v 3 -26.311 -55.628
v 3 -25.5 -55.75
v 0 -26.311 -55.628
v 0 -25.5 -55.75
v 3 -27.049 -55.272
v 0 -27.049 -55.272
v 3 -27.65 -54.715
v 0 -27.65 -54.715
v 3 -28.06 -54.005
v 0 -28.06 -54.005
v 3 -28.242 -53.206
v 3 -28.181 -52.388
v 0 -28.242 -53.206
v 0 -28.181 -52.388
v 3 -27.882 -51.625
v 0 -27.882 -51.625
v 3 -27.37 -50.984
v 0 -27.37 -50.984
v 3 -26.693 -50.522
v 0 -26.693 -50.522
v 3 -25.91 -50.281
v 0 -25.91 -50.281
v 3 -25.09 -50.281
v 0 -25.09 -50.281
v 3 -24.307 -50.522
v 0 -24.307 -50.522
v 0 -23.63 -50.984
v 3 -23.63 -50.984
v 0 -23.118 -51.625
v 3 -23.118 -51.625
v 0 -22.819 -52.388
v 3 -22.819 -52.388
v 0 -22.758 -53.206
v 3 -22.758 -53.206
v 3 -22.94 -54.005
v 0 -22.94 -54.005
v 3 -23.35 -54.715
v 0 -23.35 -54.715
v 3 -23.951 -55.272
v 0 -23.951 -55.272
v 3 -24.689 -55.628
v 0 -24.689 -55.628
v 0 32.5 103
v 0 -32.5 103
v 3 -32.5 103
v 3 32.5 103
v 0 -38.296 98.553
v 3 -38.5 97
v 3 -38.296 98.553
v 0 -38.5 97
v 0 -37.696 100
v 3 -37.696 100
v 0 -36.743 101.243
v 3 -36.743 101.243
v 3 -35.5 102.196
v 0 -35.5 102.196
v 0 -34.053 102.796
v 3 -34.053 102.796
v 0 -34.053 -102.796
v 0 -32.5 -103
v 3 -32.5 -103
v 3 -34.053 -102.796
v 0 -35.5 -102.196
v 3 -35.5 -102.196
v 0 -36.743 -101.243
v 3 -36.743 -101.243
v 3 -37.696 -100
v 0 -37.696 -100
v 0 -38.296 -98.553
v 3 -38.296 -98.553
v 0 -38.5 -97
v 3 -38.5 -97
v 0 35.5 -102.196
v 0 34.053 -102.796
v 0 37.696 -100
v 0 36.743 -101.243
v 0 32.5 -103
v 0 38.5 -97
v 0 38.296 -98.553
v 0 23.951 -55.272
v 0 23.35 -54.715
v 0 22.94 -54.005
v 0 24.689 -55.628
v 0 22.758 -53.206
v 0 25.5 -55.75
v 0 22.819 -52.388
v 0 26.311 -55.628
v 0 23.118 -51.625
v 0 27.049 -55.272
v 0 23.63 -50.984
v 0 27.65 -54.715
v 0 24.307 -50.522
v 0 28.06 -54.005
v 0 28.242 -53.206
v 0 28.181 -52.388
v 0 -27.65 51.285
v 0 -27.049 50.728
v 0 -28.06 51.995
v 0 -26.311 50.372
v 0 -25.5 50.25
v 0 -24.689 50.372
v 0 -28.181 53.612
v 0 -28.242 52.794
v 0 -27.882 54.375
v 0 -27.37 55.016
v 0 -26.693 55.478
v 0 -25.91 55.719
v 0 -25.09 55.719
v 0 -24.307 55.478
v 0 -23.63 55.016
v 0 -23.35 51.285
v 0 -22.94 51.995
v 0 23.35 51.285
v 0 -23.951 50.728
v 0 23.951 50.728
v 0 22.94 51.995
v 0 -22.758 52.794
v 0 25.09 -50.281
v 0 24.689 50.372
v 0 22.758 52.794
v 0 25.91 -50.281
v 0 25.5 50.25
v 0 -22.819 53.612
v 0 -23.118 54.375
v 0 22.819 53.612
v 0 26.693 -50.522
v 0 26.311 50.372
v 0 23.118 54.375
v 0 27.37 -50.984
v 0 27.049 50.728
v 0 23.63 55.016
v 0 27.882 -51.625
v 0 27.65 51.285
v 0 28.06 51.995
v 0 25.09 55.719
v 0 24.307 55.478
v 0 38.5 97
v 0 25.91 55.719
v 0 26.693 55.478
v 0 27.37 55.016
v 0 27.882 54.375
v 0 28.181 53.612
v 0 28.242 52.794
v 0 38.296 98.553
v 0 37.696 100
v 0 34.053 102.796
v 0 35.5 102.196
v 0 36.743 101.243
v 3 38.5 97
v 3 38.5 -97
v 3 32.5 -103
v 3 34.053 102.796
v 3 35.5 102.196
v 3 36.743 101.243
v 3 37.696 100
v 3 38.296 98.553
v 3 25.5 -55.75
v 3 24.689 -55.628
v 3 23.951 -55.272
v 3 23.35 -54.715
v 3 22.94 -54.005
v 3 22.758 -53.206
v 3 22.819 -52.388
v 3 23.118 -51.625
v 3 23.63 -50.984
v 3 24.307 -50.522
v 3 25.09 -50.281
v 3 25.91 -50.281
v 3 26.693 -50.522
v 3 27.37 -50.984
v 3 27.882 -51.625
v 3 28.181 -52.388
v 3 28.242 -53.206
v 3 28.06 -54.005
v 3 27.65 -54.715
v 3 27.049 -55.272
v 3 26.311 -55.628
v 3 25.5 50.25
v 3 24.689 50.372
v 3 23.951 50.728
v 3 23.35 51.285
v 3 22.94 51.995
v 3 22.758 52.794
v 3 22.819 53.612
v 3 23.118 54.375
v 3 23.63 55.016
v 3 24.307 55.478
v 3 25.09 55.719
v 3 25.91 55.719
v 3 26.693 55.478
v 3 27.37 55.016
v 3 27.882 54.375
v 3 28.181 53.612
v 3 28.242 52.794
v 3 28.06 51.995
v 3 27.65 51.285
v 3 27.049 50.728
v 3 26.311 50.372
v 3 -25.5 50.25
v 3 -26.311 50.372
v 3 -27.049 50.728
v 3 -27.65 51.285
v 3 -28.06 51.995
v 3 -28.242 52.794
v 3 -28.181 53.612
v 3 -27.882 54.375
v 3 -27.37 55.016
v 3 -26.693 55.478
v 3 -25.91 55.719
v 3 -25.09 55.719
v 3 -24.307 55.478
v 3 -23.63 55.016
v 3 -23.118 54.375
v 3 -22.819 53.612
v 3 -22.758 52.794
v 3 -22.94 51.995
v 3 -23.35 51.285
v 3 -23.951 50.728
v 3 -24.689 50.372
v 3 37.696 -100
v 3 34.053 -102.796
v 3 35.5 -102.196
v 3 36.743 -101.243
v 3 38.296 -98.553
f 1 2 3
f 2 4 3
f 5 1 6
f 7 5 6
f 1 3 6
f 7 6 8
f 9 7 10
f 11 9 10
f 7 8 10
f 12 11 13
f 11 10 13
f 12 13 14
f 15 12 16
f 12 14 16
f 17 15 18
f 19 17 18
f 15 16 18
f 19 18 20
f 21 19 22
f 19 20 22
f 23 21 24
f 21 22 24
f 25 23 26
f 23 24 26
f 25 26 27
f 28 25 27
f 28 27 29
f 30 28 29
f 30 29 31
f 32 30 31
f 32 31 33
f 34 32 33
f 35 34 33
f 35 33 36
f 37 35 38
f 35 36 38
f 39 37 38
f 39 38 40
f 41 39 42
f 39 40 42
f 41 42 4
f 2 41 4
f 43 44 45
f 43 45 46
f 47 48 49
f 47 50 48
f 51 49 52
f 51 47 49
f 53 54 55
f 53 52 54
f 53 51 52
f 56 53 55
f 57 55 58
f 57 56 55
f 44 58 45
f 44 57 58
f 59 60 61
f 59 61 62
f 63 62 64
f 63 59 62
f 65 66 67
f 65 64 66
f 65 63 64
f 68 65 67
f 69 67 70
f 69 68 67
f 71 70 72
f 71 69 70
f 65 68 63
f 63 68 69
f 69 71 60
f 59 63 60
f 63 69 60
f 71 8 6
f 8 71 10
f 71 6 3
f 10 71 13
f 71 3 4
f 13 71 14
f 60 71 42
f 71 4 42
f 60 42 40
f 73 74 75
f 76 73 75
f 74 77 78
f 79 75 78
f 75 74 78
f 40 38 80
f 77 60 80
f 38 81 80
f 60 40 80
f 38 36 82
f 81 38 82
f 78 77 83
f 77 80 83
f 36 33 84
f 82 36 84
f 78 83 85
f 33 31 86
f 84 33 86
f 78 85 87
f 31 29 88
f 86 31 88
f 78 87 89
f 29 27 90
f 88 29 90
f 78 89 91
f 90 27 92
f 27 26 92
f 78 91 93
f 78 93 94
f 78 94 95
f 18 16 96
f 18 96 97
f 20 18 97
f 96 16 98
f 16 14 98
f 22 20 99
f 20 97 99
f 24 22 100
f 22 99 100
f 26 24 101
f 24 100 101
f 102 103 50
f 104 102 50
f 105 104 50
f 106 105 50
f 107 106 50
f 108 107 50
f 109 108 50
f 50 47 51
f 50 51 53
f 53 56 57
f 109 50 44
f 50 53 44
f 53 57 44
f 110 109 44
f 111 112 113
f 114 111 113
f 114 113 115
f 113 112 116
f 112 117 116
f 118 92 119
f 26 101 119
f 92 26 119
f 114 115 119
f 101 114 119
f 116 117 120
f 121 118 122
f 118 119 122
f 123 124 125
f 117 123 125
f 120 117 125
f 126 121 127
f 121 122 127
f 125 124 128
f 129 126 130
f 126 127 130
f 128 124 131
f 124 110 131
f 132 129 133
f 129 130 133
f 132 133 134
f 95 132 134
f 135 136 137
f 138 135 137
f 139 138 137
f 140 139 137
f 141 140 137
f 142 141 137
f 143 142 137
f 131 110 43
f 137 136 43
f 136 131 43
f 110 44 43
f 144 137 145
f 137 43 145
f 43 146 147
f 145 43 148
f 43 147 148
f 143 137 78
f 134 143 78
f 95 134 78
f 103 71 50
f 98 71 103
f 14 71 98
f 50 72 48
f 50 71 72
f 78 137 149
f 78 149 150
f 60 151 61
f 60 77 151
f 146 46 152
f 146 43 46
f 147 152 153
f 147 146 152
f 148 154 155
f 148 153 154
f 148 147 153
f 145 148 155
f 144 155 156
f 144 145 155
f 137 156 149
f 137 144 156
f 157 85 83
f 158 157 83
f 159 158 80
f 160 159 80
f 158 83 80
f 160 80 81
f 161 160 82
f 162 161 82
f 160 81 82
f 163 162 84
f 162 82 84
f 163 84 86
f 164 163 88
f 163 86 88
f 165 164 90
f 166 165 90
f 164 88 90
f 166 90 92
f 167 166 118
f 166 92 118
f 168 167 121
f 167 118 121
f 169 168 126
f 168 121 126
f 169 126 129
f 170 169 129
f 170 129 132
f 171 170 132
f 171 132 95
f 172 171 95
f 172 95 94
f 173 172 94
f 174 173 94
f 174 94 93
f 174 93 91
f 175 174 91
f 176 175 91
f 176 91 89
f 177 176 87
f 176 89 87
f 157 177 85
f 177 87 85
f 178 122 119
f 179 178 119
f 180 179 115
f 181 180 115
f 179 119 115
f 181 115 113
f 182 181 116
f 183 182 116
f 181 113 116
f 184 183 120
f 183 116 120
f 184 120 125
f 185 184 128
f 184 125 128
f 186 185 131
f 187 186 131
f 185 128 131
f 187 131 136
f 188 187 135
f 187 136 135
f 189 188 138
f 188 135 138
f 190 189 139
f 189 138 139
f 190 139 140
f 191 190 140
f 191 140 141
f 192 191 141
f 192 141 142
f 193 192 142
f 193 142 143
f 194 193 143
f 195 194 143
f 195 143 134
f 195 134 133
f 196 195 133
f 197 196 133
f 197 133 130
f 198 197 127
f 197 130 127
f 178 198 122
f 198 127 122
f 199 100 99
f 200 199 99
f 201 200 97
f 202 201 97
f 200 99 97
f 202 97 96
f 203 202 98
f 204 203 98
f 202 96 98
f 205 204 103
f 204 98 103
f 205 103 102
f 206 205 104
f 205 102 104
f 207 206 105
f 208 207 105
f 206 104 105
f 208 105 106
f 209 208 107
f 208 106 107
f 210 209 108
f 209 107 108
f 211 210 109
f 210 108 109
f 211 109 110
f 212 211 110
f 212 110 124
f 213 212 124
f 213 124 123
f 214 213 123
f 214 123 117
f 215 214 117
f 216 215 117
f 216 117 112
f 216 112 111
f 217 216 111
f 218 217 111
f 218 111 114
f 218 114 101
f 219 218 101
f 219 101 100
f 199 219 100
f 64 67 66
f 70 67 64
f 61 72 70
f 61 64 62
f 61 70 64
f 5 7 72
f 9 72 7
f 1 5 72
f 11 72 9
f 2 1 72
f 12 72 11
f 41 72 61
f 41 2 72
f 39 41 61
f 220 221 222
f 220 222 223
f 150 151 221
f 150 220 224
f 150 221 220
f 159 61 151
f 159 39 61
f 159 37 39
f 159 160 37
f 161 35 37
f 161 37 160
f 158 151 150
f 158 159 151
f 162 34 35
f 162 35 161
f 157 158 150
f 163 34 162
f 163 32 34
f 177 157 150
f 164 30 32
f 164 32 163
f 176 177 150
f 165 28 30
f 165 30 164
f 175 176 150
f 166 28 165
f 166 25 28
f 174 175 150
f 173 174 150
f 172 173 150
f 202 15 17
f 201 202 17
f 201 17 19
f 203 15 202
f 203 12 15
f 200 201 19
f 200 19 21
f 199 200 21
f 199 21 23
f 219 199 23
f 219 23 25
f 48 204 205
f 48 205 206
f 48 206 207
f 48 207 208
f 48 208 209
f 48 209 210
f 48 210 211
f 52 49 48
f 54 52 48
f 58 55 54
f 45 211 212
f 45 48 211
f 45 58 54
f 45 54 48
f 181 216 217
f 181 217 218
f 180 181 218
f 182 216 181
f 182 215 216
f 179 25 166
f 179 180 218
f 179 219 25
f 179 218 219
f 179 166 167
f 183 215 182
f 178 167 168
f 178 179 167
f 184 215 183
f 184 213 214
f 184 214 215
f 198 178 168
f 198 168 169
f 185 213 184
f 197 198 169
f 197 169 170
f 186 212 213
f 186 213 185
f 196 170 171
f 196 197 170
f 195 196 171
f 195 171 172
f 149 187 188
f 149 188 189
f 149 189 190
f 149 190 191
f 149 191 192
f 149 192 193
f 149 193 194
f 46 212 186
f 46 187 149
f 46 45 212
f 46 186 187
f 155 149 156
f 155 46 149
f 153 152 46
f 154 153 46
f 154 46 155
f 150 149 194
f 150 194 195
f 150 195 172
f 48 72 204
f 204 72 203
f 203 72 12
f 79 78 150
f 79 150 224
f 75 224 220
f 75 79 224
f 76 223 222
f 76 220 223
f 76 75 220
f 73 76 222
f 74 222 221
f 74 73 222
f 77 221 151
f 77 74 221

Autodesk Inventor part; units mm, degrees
ref_plane "YZ Plane" through (0, 0, 0) normal (1, 0, 0) x (0, 1, 0)
ref_plane "XZ Plane" through (0, 0, 0) normal (0, 1, 0) x (-1, 0, 0)
ref_plane "XY Plane" through (0, 0, 0) normal (0, 0, 1) x (1, 0, 0)
sketch "Szkic1" plane through (0, 0, 0) normal (1, 0, 0) x (0, 1, 0)
  line L0 (-32.5, 103) -> (32.5, 103)
  line L1 (38.5, 97) -> (38.5, -97)
  line L2 (32.5, -103) -> (-32.5, -103)
  line L3 (-38.5, -97) -> (-38.5, 97)
  line L4 (-38.5, 103) -> (38.5, -103) construction
  arc A0 (32.5, -103) -> (38.5, -97) centre (32.5, -97) ccw
  arc A1 (-32.5, 103) -> (-38.5, 97) centre (-32.5, 97) ccw
  arc A2 (-38.5, -97) -> (-32.5, -103) centre (-32.5, -97) ccw
  arc A3 (38.5, 97) -> (32.5, 103) centre (32.5, 97) ccw
  point P0 (0, 0)
  dimension "d3" = 6
extrude "Płyta1" add sketch "Szkic1" along normal blind 3
sketch "Szkic2" plane through (3, 0, 0) normal (1, 0, 0) x (0, 0, -1)
  line L0 (-97, 38.5) -> (97, 38.5) projected
  line L1 (-103, -32.5) -> (-103, 32.5) projected
  line L2 (103, 32.5) -> (103, -32.5) projected
  line L3 (97, -38.5) -> (-97, -38.5) projected
  point P0 (0, 0)
  point P1 (-53, 25.5)
  point P2 (53, 25.5)
  point P3 (53, -25.5)
  point P4 (-53, -25.5)
  dimension "d5" = 13
  dimension "d6" = 50
  dimension "d7" = 50
  dimension "d8" = 13
  dimension "d9" = 50
  dimension "d10" = 13
  dimension "d11" = 13
  dimension "d12" = 50
hole "Otwór1" at (3, -25.5, 53) at (3, 25.5, 53) at (3, 25.5, -53) at (3, -25.5, -53) direction (-1, 0, 0) diameter 5.5 depth 3 tip angle 118 clearance for "Śruba ze łbem płaskim obrobiona" size "M5" standard "ANSI Profil metryczny M"
equation "\"d18\" = Grubość"
equation "\"d4\" = Grubość"
equation "\"PromieńGięcia\" = Grubość"
equation "\"SzerokośćGięciaPodcięcia\" = Grubość"
equation "\"GłębokośćGięciaPodcięcia\" = 0.5 * Grubość"
equation "\"RozmiarPodcięciaNarożnika\" = 4 * Grubość"
equation "\"MinimalnaPozostałość\" = 2 * Grubość"
equation "\"PromieńPrzejścia\" = PromieńGięcia"
equation "\"Rozmiar_promienia_Jacobiego\" = PromieńGięcia"
equation "\"Wielk_odstępu\" = Grubość"
equation "\"Grubość\" = 3"
properties part number "ZaslepkaObudowa" material "Aluminum 6061"
